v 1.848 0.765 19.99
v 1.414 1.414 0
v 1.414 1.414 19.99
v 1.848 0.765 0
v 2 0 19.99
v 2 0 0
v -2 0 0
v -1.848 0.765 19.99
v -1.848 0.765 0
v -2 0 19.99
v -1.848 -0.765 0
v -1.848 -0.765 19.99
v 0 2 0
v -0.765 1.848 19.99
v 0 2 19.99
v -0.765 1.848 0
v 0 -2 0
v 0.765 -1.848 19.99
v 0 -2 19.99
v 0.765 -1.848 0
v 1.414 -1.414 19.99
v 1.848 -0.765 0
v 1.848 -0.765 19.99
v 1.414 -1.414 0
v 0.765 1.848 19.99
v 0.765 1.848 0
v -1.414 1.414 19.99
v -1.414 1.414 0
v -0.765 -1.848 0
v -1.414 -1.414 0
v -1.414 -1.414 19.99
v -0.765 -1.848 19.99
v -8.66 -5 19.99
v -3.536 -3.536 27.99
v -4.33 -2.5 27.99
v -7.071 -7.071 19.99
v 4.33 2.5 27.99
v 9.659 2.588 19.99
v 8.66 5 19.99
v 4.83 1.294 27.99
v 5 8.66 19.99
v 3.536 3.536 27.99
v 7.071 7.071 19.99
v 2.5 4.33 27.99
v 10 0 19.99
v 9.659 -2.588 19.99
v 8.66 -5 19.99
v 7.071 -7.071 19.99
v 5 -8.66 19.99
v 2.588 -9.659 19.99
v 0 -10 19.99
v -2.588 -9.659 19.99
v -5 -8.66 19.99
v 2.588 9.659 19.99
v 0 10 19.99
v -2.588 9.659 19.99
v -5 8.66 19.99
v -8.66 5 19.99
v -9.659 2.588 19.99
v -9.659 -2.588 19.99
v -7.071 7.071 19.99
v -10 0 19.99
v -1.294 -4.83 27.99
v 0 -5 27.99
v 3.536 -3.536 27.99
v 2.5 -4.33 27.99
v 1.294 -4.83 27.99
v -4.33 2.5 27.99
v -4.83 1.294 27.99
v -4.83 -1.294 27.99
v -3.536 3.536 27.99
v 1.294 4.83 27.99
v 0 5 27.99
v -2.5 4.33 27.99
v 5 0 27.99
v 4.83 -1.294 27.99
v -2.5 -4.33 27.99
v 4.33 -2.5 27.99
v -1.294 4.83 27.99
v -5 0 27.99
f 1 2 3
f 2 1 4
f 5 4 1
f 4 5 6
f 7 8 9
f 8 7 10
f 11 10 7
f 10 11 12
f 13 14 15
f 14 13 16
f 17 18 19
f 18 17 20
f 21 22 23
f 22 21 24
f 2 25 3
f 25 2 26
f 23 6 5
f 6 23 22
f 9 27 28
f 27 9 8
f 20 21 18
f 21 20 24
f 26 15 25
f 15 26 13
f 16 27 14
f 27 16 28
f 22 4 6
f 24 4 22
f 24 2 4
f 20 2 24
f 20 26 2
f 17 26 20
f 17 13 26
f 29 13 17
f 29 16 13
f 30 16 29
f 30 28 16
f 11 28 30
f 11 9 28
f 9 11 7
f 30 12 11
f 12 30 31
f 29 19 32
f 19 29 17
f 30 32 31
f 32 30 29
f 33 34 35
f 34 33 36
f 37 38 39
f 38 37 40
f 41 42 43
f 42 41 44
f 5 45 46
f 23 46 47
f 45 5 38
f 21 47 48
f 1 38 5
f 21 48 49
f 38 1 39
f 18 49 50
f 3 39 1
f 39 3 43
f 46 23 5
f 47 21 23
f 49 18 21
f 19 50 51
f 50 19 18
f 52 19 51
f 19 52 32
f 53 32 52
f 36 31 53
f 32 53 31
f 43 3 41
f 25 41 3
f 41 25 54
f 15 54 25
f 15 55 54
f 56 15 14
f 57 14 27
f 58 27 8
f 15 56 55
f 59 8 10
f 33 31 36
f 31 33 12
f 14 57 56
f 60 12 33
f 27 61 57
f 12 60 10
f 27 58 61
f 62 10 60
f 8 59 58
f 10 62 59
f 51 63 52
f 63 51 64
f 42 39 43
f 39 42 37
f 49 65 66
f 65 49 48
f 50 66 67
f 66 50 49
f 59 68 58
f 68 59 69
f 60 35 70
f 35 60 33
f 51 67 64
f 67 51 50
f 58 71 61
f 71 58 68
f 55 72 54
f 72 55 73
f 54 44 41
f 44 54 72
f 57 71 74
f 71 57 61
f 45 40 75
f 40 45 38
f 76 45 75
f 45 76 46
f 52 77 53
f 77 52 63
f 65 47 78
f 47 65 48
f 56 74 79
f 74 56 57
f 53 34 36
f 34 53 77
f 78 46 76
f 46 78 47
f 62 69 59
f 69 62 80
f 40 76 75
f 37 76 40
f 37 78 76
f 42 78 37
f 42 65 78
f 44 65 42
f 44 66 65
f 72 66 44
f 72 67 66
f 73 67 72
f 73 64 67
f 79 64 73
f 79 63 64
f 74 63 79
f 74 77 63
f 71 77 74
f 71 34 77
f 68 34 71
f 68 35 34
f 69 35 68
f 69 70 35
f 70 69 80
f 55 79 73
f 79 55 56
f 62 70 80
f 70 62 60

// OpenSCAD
// file: shade..scad
// Many Projects - Test Fixture: a part whose file name has two dots.
module shade() {
    cylinder(r1 = 10, r2 = 5, h = 8, $fn = 24);
}
// main file
// Many Projects - Test Fixture: a project in a subfolder whose model
// includes a file with two dots in its name.
include <shade..scad>

/*[Lamp]*/
height = 20; // [10:1:40]

cylinder(r = 2, h = height, $fn = 16);
// Overlap the stem by 0.01 mm so the two solids share no face.
translate([0, 0, height - 0.01]) shade();
